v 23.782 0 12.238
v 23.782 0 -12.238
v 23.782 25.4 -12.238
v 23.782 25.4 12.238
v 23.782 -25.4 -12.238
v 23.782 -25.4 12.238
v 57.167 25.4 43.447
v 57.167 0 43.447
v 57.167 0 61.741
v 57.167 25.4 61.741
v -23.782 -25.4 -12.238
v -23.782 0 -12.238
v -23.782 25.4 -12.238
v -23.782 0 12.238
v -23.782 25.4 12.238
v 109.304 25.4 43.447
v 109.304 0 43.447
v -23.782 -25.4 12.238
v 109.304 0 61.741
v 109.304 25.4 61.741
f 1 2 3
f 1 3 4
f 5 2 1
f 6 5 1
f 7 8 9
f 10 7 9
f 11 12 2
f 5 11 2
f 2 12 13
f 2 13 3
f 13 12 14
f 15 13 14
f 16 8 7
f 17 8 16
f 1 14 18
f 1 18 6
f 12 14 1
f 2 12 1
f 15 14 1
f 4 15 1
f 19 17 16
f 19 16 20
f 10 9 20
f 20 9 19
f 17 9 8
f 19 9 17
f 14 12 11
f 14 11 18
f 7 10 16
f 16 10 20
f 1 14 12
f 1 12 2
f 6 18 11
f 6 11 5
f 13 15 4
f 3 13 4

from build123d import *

# Parameters (mm, degrees)
F0_W     = 47.563144
F0_H     = 24.475142
F1_DEPTH = 25.4
F0_W_2   = 52.13651
F0_H_2   = 18.293515
F2_DEPTH = 25.4


with BuildPart() as f1:
    # F0 (on Front) → F1 (new body)
    with BuildSketch(Plane.XZ):
        Rectangle(F0_W, F0_H)
    extrude(amount=F1_DEPTH)


with BuildPart() as f2:
    # F0 (on Front) → F2 (new body)
    with BuildSketch(Plane.XZ):
        with Locations((83.23548, 52.593846)):
            Rectangle(F0_W_2, F0_H_2)
        Rectangle(F0_W, F0_H)
    extrude(amount=-F2_DEPTH)


solid = Compound([f1.part, f2.part])
